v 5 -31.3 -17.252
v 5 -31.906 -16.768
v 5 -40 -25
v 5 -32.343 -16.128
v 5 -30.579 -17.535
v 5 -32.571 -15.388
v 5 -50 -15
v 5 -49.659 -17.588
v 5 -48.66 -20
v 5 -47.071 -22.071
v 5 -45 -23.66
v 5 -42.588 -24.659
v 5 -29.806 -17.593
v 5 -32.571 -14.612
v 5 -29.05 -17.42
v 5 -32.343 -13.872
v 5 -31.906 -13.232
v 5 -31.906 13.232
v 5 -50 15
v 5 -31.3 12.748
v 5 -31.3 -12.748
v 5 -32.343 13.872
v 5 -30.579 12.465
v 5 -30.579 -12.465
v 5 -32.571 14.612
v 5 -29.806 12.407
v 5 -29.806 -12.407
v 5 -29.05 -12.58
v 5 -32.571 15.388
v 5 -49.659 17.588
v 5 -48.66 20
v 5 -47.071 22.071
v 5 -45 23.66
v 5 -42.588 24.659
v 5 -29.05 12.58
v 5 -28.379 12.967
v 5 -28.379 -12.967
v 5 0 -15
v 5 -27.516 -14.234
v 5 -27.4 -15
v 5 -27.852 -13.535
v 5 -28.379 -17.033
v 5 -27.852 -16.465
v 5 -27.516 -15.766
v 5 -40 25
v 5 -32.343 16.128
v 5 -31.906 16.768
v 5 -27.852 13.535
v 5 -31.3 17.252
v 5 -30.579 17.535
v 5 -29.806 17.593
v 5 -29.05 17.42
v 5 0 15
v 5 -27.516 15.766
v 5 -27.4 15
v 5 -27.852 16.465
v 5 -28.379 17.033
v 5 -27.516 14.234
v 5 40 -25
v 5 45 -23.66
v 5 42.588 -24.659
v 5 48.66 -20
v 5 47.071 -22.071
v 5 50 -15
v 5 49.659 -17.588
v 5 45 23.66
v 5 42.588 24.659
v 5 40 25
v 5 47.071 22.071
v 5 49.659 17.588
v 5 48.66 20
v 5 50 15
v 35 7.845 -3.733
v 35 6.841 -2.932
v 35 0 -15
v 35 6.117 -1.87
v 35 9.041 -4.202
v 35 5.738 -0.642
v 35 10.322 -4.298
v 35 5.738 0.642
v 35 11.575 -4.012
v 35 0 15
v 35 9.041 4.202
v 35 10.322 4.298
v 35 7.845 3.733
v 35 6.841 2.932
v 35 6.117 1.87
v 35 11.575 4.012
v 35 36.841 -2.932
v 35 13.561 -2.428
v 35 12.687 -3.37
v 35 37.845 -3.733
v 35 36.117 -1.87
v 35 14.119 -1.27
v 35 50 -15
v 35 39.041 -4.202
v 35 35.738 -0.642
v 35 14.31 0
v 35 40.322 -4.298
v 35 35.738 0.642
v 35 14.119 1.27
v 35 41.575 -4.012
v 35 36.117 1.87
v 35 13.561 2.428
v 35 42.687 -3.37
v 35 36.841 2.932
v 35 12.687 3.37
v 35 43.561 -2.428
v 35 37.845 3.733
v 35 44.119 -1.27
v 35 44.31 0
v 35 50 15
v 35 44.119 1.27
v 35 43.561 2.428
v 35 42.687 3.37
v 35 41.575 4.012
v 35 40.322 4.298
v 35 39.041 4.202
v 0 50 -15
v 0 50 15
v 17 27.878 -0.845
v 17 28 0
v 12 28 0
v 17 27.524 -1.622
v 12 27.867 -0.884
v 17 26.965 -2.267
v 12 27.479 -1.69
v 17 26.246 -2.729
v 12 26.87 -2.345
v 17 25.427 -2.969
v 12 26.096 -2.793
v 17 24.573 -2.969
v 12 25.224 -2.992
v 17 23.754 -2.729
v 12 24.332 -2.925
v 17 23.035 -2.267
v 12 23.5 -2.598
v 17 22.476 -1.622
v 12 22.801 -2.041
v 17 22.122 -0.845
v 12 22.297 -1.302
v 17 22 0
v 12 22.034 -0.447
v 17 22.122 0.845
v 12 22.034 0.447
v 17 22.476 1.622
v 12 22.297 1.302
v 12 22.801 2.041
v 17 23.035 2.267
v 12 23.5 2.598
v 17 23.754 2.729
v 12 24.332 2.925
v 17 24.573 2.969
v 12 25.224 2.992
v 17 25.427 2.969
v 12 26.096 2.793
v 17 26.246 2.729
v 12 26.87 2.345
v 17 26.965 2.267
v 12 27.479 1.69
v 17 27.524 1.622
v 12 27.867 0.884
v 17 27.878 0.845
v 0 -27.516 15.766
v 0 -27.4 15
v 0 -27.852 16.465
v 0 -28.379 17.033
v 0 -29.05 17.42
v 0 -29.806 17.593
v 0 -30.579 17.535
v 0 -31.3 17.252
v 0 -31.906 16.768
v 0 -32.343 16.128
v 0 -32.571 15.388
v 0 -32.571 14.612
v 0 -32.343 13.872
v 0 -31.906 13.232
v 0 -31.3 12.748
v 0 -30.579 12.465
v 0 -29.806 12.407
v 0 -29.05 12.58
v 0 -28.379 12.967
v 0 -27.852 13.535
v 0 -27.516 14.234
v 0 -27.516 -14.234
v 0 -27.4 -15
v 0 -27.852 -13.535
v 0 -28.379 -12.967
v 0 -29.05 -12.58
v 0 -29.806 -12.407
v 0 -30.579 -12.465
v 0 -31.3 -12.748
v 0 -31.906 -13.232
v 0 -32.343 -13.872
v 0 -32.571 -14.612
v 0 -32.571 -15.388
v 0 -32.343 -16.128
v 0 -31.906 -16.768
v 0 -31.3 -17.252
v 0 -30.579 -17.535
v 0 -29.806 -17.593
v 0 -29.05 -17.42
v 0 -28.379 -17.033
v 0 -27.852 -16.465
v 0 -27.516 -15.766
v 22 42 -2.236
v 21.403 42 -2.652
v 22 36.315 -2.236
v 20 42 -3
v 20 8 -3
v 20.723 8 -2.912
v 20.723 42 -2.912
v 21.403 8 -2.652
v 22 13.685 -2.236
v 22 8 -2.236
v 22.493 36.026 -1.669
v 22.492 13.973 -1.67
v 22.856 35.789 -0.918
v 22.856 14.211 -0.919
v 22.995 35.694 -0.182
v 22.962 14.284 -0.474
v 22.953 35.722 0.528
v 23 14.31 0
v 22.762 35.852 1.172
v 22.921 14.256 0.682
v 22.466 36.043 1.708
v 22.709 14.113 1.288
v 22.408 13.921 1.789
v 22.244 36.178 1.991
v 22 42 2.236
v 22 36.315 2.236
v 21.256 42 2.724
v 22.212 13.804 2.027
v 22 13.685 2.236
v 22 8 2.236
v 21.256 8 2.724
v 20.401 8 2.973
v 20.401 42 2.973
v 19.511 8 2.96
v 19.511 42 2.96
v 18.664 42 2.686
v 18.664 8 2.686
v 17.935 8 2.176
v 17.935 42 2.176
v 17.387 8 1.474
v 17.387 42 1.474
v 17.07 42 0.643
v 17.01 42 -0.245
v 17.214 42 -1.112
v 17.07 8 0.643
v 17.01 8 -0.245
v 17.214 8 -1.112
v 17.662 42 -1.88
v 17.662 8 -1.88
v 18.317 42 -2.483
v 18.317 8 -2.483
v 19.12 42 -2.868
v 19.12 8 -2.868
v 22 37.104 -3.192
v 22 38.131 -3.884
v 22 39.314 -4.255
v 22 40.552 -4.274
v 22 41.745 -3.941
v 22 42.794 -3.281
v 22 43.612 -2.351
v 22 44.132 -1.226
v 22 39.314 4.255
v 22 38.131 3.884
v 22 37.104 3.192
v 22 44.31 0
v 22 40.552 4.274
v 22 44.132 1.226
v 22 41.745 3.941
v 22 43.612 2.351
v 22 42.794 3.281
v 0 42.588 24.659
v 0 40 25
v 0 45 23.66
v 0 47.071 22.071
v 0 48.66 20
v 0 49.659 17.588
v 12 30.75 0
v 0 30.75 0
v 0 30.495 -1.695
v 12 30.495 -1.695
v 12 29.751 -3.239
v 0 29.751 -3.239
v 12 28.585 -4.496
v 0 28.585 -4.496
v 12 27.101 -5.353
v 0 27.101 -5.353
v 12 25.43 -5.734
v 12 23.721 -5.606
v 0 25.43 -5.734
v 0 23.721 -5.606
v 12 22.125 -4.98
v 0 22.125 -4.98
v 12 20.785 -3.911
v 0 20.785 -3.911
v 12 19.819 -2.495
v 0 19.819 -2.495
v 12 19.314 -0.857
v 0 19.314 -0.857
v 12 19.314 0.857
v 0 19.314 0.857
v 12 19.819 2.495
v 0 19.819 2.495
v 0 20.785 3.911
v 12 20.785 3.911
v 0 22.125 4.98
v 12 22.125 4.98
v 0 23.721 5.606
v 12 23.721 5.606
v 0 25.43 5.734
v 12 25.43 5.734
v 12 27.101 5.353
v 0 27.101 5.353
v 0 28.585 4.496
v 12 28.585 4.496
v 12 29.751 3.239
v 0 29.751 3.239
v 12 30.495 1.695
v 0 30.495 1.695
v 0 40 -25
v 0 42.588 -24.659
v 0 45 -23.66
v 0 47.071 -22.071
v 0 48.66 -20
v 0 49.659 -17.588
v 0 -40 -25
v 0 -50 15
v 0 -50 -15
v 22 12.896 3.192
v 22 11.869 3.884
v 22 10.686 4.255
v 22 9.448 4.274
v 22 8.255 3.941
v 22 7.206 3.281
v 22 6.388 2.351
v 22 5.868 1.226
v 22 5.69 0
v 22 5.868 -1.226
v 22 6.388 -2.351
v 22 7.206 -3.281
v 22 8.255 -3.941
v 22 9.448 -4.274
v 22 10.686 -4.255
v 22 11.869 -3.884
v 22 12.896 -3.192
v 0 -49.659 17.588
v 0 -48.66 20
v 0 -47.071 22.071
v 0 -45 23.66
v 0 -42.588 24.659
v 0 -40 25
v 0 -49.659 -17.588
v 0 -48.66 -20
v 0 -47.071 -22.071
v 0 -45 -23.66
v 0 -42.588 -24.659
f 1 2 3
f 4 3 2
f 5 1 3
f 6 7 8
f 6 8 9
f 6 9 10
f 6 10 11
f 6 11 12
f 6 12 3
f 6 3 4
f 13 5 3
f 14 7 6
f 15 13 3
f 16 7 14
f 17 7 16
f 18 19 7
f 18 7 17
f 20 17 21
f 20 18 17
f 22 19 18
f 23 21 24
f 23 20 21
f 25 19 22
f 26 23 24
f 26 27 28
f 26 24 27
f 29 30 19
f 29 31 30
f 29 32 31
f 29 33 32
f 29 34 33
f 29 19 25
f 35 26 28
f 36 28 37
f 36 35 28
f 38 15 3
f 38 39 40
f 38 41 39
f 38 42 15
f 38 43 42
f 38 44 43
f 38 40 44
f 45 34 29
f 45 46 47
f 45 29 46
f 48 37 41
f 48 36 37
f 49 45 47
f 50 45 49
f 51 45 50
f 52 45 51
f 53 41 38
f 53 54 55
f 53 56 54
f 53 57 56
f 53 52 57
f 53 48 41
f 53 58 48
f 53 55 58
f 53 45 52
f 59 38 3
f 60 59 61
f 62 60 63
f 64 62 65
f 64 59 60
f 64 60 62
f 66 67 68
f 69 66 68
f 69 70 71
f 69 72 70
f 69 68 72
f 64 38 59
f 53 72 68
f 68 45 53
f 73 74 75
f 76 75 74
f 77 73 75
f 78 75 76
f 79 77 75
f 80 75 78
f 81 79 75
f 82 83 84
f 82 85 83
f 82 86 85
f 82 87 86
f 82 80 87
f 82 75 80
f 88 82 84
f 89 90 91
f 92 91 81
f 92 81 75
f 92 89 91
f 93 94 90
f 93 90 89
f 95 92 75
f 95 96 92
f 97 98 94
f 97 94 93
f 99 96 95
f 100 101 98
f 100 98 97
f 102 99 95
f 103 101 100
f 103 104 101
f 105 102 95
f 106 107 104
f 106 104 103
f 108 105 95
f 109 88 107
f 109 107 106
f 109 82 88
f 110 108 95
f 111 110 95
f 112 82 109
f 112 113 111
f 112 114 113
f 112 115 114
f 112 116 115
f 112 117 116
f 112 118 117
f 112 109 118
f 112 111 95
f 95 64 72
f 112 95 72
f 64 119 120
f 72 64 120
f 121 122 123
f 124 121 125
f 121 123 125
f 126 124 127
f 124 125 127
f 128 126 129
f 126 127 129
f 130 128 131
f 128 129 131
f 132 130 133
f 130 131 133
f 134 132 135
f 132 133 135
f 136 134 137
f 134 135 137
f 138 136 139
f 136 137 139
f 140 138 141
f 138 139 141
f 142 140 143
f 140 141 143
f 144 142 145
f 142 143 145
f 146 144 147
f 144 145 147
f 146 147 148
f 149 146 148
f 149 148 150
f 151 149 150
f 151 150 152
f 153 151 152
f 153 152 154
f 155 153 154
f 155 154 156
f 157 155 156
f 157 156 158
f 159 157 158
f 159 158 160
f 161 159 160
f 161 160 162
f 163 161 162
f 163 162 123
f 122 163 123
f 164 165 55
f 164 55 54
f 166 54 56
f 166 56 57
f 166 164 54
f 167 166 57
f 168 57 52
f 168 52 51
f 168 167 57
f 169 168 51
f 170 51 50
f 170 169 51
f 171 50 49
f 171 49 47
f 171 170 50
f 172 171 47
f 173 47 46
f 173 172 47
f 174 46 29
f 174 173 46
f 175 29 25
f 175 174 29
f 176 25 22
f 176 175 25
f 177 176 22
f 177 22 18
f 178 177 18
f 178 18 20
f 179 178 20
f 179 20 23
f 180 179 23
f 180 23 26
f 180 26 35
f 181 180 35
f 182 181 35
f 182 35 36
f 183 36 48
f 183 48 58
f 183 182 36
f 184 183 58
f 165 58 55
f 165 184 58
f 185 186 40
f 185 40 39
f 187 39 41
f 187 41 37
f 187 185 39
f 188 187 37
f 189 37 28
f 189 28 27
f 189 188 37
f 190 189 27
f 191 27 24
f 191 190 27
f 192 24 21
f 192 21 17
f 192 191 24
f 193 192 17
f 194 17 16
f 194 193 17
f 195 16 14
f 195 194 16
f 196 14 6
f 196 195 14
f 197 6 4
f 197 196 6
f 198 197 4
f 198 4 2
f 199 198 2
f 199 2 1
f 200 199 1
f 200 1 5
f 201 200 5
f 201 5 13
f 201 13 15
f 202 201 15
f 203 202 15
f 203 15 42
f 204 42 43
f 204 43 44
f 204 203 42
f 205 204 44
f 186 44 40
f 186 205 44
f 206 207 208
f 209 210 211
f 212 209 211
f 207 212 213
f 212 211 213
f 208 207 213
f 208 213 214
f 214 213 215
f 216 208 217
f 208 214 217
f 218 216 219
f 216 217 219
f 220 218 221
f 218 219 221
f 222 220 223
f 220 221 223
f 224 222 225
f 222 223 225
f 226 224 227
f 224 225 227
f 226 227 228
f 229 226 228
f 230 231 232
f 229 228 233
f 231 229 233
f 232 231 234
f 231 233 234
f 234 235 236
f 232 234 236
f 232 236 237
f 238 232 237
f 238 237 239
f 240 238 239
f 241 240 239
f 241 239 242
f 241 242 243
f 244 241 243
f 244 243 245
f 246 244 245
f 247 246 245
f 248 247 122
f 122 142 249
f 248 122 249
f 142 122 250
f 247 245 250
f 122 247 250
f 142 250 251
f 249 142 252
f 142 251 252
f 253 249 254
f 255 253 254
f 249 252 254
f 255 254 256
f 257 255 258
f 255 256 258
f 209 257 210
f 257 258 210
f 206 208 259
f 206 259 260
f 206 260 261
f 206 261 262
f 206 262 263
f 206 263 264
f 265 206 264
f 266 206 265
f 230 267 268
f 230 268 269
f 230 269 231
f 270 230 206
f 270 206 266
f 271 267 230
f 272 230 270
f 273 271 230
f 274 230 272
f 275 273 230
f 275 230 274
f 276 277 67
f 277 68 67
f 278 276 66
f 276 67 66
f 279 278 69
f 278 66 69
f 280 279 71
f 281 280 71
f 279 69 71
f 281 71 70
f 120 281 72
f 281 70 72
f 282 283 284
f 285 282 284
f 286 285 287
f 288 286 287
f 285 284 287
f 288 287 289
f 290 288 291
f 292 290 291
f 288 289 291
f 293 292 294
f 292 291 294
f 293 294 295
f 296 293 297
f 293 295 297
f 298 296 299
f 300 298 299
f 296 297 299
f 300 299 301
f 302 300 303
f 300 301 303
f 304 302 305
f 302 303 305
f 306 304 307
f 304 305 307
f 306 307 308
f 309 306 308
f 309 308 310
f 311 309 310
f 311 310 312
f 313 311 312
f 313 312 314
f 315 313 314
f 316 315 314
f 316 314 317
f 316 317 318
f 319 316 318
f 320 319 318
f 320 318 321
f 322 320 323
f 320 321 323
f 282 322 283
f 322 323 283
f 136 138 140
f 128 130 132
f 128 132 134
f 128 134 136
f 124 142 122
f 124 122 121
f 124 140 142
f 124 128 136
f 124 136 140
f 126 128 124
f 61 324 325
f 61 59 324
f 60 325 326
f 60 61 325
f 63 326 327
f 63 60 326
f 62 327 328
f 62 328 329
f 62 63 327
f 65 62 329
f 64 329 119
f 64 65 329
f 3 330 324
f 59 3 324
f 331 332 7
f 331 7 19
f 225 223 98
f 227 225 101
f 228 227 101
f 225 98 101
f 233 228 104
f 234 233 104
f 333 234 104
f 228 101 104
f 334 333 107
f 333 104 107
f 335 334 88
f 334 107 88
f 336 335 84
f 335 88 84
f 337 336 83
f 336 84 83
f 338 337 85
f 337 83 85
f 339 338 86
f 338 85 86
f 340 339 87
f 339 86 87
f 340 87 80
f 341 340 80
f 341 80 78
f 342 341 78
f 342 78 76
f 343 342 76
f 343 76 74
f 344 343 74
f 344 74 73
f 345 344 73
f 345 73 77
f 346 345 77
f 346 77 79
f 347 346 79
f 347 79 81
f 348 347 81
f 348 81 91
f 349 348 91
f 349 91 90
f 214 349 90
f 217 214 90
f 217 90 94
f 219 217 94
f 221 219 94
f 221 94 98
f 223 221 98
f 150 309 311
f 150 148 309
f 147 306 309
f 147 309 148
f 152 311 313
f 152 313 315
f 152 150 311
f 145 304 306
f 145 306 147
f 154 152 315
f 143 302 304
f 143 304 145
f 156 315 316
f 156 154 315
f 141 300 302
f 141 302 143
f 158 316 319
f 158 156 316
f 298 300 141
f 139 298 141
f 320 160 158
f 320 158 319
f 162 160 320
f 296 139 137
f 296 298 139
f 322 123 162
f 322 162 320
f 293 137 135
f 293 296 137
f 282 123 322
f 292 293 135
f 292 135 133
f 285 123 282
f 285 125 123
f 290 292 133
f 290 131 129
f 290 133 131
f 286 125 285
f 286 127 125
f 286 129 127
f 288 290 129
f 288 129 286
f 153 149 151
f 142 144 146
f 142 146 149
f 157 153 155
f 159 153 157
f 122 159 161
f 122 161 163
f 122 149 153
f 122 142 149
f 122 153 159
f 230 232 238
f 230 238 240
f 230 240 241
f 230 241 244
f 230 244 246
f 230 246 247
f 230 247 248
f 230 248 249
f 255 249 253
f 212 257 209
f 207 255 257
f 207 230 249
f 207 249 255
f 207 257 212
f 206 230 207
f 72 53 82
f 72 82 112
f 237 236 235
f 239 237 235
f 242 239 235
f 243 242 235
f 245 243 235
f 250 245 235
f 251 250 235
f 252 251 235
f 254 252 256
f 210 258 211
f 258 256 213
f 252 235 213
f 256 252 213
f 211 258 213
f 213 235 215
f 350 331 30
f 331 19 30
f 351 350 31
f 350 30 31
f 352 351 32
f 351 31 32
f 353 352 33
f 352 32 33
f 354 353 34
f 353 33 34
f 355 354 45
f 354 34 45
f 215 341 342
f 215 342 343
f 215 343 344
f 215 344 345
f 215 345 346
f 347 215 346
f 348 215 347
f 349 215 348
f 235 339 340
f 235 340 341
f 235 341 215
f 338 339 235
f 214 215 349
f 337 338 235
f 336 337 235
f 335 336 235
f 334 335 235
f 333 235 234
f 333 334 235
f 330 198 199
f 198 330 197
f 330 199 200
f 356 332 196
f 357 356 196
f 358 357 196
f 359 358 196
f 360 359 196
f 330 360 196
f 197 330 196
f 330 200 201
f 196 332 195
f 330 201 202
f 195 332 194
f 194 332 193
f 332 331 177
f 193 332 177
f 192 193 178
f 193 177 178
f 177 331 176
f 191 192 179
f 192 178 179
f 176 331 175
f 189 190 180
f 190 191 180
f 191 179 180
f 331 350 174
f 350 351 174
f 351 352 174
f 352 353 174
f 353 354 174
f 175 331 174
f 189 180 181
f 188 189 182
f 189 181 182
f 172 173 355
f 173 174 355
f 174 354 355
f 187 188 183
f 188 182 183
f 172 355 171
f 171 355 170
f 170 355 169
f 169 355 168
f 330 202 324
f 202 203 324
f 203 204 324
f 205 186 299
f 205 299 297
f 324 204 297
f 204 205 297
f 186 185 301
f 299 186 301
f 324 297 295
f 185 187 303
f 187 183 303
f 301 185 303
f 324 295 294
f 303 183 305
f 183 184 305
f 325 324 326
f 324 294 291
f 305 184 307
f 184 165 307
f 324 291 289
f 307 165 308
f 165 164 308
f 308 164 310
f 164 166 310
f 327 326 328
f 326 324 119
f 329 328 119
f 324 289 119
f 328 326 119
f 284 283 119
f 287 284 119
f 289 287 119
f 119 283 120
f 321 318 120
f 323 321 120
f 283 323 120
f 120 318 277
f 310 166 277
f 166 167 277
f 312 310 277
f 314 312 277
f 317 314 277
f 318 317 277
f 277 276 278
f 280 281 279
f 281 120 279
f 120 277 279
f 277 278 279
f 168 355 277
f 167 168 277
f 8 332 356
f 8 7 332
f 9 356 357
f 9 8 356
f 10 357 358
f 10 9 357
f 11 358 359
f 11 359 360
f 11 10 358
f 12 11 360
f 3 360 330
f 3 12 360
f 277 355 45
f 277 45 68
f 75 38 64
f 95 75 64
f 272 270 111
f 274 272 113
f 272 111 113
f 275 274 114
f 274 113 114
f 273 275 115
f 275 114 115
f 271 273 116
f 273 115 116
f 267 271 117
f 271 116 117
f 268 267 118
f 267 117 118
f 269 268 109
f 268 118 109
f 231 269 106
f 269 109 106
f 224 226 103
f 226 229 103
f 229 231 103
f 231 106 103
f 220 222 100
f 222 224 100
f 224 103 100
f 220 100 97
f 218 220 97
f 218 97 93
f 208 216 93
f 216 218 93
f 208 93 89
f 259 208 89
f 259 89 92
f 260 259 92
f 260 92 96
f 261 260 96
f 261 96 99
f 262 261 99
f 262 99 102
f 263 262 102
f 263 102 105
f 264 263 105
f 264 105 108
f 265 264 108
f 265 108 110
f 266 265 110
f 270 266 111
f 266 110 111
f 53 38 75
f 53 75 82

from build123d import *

# Parameters (mm, degrees)
SKETCH_W        = 100
SKETCH_H        = 50
SKETCH_R        = 2.6
PAD_DEPTH       = 5
SKETCH001_W     = 50
SKETCH001_H     = 30
PAD001_DEPTH    = 30
SKETCH003_R     = 5.75
POCKET001_DEPTH = 12
SKETCH004_R     = 3
POCKET_DEPTH    = 34
SKETCH005_R     = 3
POCKET002_DEPTH = 5
SKETCH006_R     = 4.31
POCKET003_DEPTH = 13
FILLET_R        = 10


with BuildPart() as part:
    # Sketch → Pad (new body)
    with BuildSketch(Plane.YZ):
        Rectangle(SKETCH_W, SKETCH_H)
        with Locations((-30, 15)):
            Circle(SKETCH_R, mode=Mode.SUBTRACT)
        with Locations((-30, -15)):
            Circle(SKETCH_R, mode=Mode.SUBTRACT)
    extrude(amount=PAD_DEPTH)

    # Sketch001 (on Face8 of Pad) → Pad001 (join)
    with BuildSketch(Plane.YZ.offset(5)):
        with Locations((25, 0)):
            Rectangle(SKETCH001_W, SKETCH001_H)
    extrude(amount=PAD001_DEPTH)

    # Sketch003 → Pocket001 (cut)
    with BuildSketch(Plane(origin=(0, 0, 0), x_dir=(0, 1, 0), z_dir=(-1, 0, 0))):
        with Locations((25, 0)):
            Circle(SKETCH003_R)
    extrude(amount=-POCKET001_DEPTH, mode=Mode.SUBTRACT)

    # Sketch004 (on DatumPlane) → Pocket (cut)
    with BuildSketch(Plane(origin=(0, 8, 0), x_dir=(0, 0, -1), z_dir=(0, -1, 0))):
        with Locations((0, 20)):
            Circle(SKETCH004_R)
    extrude(amount=-POCKET_DEPTH, mode=Mode.SUBTRACT)

    # Sketch005 (on Face15 of Pocket) → Pocket002 (cut)
    with BuildSketch(Plane(origin=(12, 0, 0), x_dir=(0, 1, 0), z_dir=(-1, 0, 0))):
        with Locations((25, 0)):
            Circle(SKETCH005_R)
    extrude(amount=-POCKET002_DEPTH, mode=Mode.SUBTRACT)

    # Sketch006 (on Face14 of Pocket002) → Pocket003 (cut)
    with BuildSketch(Plane.YZ.offset(35)):
        with Locations((10, 0)):
            Circle(SKETCH006_R)
        with Locations((40, 0)):
            Circle(SKETCH006_R)
    extrude(amount=-POCKET003_DEPTH, mode=Mode.SUBTRACT)

    # Fillet
    fillet_edges = [part.edges().sort_by_distance(p)[0] for p in [
        (2.5, -50, 25),
        (2.5, 50, -25),
        (2.5, 50, 25),
        (2.5, -50, -25),
    ]]
    fillet(fillet_edges, radius=FILLET_R)


solid = part.part
